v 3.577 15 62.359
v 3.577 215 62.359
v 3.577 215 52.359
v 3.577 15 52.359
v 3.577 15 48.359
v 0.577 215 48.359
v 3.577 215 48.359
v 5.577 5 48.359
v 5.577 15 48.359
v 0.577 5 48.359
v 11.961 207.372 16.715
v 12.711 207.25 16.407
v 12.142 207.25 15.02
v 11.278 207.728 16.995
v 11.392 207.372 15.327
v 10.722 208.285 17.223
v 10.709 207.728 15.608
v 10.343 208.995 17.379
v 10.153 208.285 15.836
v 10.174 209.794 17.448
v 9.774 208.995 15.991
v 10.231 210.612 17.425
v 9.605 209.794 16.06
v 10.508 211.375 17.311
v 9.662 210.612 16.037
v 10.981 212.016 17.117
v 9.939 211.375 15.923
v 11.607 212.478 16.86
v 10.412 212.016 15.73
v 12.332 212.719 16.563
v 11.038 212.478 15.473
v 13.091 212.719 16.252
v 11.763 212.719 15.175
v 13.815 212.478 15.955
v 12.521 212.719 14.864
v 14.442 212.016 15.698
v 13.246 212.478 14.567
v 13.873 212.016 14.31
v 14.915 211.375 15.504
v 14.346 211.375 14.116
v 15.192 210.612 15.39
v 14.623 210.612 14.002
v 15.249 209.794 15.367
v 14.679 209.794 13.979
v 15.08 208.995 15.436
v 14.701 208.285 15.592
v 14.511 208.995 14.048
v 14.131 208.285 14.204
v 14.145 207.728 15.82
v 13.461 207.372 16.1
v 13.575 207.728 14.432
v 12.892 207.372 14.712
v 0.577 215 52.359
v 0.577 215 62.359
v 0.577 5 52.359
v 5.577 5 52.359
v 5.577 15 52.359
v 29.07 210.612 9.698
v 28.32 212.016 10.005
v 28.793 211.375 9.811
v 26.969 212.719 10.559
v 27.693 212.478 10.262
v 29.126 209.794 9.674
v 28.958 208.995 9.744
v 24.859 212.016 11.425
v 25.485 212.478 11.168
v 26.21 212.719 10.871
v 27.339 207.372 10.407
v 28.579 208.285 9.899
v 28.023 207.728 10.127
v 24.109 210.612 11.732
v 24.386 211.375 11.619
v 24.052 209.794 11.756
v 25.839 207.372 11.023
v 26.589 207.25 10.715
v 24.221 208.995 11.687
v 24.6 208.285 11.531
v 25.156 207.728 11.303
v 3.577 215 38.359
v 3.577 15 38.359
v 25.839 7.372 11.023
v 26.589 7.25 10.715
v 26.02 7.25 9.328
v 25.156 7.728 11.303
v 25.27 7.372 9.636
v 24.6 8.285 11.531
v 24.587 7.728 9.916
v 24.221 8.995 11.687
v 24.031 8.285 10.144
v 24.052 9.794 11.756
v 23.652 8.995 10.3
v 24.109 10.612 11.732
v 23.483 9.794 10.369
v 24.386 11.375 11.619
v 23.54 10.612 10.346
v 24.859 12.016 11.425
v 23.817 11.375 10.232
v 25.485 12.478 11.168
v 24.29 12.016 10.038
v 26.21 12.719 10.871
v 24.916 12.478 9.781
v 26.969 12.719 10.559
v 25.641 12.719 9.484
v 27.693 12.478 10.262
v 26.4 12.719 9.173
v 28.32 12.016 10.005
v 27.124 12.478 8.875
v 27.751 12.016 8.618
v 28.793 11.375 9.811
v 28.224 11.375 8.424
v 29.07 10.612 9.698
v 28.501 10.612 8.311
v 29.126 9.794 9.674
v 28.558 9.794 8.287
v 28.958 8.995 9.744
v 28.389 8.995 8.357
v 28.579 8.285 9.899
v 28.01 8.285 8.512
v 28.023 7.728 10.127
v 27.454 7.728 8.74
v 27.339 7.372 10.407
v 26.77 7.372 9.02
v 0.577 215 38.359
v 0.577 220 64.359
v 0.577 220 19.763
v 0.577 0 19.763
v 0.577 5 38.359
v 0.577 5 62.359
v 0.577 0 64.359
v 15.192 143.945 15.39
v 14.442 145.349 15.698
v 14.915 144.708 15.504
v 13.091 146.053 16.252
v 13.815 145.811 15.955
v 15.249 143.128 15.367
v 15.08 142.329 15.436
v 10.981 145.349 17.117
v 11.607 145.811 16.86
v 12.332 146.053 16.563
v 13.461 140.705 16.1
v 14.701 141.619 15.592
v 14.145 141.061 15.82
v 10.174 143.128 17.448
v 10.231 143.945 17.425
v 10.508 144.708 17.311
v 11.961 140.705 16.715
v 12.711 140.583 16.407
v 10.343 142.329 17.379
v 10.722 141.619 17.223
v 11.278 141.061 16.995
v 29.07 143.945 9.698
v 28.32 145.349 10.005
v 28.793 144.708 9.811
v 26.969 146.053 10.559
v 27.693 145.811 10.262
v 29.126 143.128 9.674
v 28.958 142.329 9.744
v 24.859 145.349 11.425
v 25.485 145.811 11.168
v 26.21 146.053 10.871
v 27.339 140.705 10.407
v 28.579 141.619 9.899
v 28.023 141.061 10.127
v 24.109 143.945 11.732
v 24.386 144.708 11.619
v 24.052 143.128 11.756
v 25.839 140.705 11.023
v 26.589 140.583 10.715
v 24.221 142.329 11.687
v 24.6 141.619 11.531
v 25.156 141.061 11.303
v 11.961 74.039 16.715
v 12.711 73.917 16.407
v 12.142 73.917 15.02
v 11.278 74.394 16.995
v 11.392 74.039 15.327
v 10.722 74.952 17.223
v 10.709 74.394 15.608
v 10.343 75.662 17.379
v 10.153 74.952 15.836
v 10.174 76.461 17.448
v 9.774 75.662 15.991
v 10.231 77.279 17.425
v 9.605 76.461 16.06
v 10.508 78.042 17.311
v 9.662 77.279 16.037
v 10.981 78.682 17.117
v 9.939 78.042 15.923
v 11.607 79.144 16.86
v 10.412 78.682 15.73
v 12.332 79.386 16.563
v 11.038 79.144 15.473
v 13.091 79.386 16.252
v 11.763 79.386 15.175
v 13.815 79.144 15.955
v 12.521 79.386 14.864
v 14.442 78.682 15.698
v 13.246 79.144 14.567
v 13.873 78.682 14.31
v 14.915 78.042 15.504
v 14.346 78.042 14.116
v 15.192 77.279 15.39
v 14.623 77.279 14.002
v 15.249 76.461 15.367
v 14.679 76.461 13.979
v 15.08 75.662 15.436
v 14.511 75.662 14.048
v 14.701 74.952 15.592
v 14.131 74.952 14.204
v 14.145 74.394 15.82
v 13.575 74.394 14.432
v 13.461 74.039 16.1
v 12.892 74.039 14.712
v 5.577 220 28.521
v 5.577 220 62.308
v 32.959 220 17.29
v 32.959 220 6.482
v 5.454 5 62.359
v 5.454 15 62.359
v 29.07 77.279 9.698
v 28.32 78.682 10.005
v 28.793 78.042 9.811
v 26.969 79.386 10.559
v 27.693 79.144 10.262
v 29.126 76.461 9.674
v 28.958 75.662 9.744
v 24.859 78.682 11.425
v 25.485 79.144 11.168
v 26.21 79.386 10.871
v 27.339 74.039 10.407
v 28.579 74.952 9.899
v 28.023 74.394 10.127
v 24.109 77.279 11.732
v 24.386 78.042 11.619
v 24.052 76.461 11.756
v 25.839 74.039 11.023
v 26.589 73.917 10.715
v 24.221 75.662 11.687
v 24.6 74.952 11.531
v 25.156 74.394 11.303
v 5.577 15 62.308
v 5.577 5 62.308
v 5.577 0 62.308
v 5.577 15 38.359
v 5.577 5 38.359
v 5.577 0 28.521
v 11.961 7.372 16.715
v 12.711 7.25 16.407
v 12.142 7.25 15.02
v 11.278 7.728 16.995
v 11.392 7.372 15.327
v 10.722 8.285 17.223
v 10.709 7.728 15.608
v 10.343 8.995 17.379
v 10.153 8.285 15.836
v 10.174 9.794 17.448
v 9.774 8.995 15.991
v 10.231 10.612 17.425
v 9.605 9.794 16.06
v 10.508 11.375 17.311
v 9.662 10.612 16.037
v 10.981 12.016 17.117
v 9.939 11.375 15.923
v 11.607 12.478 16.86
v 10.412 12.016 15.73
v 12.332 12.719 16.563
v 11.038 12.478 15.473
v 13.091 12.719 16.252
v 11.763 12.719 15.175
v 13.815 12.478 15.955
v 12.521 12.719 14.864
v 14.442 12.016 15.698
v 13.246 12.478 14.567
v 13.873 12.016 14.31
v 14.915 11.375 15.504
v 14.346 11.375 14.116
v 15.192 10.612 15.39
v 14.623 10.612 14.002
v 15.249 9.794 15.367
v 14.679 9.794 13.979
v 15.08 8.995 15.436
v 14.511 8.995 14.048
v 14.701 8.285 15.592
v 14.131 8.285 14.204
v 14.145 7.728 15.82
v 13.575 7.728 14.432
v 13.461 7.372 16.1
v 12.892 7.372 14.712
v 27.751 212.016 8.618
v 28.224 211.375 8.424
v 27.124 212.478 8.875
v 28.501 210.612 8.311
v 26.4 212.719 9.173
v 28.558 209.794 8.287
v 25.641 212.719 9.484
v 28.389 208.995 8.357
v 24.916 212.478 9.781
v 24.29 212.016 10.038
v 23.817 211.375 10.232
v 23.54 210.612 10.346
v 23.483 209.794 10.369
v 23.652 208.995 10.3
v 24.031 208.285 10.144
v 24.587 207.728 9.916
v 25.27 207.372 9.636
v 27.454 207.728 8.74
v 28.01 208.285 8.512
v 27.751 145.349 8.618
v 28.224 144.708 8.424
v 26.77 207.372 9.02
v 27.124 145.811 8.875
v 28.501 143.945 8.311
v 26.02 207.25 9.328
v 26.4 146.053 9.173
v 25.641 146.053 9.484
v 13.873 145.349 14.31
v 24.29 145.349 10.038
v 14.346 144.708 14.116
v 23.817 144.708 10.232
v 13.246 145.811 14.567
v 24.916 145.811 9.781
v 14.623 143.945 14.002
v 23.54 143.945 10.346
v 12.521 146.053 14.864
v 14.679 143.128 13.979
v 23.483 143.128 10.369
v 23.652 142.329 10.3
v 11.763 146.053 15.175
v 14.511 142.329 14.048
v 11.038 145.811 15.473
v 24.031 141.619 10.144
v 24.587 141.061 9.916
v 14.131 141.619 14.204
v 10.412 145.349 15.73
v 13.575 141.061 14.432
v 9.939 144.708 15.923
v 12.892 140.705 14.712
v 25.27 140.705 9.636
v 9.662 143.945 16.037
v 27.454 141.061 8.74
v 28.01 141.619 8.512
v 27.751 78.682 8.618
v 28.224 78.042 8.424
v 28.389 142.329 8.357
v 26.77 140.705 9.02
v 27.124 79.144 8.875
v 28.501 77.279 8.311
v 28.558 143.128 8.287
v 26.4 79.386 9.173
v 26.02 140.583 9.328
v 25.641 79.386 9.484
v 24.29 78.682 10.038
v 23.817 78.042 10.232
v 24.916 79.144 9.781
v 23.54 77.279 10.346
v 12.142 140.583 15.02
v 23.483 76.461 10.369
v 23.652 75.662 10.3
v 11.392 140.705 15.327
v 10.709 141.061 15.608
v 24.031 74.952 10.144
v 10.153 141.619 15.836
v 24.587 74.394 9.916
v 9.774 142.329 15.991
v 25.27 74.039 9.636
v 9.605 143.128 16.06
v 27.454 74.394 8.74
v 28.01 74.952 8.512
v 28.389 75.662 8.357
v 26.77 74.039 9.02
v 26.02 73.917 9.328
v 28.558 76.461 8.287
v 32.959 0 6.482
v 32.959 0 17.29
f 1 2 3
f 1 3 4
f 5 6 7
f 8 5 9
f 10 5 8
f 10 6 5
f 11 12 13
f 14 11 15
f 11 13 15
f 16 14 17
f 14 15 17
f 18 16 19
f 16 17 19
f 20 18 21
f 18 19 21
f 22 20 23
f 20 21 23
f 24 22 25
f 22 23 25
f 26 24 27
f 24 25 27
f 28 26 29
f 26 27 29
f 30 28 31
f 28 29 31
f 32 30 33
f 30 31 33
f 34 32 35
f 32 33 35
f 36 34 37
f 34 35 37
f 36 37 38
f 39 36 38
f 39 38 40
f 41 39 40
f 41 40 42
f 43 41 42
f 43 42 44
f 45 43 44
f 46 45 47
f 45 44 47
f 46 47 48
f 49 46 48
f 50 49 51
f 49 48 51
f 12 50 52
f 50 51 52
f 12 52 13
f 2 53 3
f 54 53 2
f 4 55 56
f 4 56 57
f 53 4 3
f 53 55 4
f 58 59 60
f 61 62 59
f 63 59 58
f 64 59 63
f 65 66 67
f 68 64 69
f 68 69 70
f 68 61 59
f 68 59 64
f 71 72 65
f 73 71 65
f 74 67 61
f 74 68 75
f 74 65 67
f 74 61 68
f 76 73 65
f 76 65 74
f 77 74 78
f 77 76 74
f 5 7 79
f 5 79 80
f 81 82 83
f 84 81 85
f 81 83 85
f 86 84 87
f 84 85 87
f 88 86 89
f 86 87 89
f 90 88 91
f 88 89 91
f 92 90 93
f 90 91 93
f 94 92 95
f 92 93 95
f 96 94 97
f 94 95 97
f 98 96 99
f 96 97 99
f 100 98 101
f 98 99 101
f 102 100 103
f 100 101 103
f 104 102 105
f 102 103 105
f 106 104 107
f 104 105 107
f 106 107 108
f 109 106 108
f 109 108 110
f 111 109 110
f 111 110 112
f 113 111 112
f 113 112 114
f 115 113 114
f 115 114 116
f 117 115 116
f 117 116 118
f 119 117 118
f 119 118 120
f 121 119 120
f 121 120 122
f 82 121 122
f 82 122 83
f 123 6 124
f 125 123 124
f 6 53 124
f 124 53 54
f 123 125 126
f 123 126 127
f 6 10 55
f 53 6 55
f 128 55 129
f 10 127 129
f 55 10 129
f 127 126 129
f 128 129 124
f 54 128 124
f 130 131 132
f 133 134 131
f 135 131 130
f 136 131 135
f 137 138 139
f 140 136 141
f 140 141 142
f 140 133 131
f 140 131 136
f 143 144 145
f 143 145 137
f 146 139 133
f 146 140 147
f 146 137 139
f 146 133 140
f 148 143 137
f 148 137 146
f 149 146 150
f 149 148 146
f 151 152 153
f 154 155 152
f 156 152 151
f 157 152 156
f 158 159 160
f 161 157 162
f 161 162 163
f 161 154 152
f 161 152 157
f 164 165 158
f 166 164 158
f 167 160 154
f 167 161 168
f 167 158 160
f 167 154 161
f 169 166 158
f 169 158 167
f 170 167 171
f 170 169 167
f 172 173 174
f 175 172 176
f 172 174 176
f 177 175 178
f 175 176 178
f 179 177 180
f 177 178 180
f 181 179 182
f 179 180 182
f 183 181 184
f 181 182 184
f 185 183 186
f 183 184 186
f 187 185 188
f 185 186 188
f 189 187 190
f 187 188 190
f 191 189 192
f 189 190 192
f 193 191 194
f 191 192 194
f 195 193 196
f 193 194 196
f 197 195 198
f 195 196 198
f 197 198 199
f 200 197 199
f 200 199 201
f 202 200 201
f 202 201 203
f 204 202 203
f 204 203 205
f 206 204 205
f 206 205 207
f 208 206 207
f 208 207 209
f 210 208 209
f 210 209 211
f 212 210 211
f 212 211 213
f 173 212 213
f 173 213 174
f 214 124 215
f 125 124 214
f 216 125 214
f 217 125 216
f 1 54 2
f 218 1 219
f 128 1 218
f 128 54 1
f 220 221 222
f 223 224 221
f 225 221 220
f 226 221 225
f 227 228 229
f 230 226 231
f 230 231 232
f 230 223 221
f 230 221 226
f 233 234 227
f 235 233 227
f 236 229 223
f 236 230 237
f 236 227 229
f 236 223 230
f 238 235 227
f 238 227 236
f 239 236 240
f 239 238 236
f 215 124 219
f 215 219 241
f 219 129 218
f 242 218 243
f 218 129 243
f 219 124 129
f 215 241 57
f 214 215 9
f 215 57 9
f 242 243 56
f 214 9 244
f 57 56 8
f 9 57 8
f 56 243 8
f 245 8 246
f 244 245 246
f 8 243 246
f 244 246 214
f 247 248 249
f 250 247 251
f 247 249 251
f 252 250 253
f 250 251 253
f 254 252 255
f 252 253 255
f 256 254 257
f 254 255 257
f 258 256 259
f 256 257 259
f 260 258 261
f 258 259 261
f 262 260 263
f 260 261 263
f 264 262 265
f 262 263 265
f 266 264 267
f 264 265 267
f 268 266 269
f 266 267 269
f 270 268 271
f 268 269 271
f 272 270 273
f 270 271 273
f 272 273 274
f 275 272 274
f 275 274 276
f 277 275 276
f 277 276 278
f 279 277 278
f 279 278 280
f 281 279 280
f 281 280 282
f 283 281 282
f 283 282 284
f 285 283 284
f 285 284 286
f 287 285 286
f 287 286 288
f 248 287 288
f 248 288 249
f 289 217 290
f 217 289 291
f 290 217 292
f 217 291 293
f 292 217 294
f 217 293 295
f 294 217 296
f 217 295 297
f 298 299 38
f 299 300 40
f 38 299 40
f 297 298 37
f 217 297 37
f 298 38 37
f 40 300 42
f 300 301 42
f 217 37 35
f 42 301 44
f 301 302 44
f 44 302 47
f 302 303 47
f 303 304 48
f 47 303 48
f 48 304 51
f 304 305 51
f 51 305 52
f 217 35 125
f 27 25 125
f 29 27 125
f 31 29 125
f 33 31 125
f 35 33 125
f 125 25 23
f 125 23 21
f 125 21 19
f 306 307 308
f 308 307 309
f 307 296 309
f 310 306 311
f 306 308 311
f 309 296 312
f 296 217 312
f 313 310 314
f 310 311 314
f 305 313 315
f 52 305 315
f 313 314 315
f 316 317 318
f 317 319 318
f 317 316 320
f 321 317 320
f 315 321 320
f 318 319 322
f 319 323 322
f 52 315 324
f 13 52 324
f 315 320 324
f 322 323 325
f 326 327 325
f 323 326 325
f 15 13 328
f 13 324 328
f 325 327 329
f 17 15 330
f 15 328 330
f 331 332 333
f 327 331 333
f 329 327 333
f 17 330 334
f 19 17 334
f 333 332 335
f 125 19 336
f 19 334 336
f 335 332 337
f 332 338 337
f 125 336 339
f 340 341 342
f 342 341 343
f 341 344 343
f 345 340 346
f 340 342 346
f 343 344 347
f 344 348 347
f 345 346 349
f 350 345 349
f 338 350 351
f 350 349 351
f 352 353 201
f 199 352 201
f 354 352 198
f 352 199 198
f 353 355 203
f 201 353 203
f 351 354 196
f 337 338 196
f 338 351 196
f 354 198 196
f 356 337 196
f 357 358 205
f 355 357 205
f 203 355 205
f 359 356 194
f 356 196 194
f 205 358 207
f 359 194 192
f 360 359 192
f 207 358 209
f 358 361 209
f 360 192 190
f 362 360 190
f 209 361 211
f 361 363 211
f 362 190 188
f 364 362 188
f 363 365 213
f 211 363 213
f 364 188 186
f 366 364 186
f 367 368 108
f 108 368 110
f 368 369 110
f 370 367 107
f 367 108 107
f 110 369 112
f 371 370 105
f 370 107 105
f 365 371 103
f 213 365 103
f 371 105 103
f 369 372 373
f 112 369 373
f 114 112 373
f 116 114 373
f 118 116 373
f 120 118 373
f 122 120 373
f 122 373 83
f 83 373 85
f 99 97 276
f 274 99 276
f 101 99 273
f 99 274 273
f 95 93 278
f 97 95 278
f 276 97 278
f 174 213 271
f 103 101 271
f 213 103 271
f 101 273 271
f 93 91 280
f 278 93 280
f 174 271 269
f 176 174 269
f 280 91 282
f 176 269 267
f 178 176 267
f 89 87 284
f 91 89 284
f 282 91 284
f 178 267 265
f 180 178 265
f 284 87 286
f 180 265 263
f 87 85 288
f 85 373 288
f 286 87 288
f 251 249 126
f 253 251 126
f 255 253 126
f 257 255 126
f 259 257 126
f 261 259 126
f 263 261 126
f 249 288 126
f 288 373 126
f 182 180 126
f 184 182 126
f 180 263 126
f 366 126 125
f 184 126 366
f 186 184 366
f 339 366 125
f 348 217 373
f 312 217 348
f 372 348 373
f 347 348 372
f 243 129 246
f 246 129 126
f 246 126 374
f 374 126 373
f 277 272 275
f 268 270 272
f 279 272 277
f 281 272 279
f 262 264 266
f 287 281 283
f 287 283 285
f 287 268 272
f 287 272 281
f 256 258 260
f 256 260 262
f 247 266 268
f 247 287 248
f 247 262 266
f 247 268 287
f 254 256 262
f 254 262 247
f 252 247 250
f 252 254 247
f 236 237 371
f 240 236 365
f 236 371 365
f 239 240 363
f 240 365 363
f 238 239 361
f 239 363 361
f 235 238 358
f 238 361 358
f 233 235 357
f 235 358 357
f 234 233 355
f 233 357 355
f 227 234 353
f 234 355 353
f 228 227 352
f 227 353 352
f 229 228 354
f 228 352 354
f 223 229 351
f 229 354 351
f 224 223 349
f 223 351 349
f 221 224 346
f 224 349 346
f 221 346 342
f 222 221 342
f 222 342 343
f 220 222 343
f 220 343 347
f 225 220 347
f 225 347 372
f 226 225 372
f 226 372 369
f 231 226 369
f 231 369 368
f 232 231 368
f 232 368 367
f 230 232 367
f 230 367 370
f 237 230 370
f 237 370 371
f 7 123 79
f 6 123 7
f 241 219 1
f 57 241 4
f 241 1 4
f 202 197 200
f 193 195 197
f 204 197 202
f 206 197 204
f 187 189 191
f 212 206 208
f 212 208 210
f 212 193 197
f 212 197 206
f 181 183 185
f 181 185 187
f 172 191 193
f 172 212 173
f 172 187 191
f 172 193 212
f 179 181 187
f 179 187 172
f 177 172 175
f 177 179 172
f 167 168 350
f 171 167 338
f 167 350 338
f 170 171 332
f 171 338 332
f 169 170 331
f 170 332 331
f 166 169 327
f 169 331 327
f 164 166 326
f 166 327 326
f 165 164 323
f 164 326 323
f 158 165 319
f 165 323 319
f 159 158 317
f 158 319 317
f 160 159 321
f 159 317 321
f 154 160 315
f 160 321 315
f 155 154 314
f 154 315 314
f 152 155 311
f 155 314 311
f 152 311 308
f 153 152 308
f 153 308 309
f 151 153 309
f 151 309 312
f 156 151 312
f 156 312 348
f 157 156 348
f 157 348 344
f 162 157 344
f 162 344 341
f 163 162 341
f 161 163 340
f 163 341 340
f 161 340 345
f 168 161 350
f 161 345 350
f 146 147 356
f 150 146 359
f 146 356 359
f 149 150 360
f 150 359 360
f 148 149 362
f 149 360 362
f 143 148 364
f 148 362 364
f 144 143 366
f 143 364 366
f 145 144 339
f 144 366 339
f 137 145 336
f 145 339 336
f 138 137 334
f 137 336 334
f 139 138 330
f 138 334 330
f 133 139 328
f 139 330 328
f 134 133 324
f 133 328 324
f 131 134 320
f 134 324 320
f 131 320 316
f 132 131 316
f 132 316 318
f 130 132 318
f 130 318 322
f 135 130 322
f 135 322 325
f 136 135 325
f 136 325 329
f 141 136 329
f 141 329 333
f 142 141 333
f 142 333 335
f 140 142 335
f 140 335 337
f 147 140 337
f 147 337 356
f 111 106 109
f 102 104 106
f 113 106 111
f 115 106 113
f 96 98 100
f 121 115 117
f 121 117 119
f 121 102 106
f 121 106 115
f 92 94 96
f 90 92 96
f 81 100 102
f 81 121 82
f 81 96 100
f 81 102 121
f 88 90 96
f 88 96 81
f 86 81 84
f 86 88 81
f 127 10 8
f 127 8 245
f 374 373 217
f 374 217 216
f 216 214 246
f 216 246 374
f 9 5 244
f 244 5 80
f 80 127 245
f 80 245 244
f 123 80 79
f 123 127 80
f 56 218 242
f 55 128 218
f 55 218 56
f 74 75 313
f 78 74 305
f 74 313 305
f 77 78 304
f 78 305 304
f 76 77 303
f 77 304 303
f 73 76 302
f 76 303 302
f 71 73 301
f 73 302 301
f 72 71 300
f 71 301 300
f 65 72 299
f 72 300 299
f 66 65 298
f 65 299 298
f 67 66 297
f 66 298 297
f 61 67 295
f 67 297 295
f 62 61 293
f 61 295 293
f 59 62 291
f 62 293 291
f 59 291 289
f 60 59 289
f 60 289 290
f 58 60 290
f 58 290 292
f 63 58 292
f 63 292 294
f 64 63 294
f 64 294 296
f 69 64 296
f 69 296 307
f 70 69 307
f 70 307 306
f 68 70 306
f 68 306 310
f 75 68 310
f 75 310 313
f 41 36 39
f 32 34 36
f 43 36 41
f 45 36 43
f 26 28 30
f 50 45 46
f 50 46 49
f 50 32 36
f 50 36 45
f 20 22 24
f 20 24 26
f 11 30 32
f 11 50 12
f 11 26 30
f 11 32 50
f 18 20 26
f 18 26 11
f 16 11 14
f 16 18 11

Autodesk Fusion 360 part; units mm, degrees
sketch "Name Sign LED Holder Top" plane through (0, 0, 0) normal (0, 1, 0) x (1, 0, 0)
  line L0 (0.5771, -64.3591) -> (5.5771, -64.3591)
  line L1 (5.5771, -64.3591) -> (5.5771, -28.5209)
  line L2 (5.5771, -28.5209) -> (36.754, -15.7343)
  line L3 (36.754, -15.7343) -> (32.9594, -6.4822)
  line L4 (32.9594, -6.4822) -> (0.5771, -19.7631)
  line L5 (0.5771, -19.7631) -> (0.5771, -64.3591)
  line L6 (0.5771, -64.3591) -> (5.5771, -62.3085)
  line L7 (32.9594, -6.4822) -> (32.9594, -17.2905)
  dimension "d1" = 5
  dimension "d2" = 10
  dimension "d3" = 112.3
  dimension "d16" = 44.596
  dimension "d18" = 22.3
  dimension "d20" = 35
extrude "Extrude1" add sketch "Name Sign LED Holder Top" along normal blind 220 contours L1 L2 L4 L5 L6 L7
sketch "LED Grooves" plane through (0.5771, 0, 0) normal (-1, 0, 0) x (0, -1, 0)
  line L0 (0, 19.7631) -> (0, 64.3591)
  line L1 (-220, 64.3591) -> (-220, 19.7631)
  line L2 (-220, 19.7631) -> (0, 19.7631)
  line L3 (-215, 62.3591) -> (-5, 62.3591)
  line L4 (-5, 62.3591) -> (-5, 52.3591)
  line L5 (-5, 52.3591) -> (-215, 52.3591)
  line L6 (-215, 52.3591) -> (-215, 62.3591)
  line L7 (-215, 48.3591) -> (-5, 48.3591)
  line L8 (-5, 48.3591) -> (-5, 38.3591)
  line L9 (-5, 38.3591) -> (-215, 38.3591)
  line L10 (-215, 38.3591) -> (-215, 48.3591)
  line L11 (-5, 62.3591) -> (-15, 62.3591)
  line L12 (-15, 52.3591) -> (-5, 52.3591)
  line L13 (-5, 52.3591) -> (-5, 62.3591)
  line L14 (-5, 48.3591) -> (-15, 48.3591)
  line L15 (-15, 38.3591) -> (-5, 38.3591)
  line L16 (-5, 38.3591) -> (-5, 48.3591)
  line L17 (0, 64.3591) -> (-220, 64.3591)
  dimension "d6" = 210
  dimension "d7" = 210
  dimension "d8" = 5
  dimension "d9" = 5
  dimension "d12" = 10
  dimension "d13" = 10
  dimension "d22" = 4
  dimension "d30" = 2
extrude "Extrude2" cut sketch "LED Grooves" against normal blind 3 contours L3 L4 L5 L6 L11 L12 L13 | L7 L8 L9 L10 L14 L15 L16
sketch "Top LED Hole" plane through (3.5771, 0, 0) normal (-1, 0, 0) x (0, -1, 0)
  line L0 (-215, 52.3591) -> (-5, 52.3591)
  line L1 (-5, 52.3591) -> (-5, 62.3591)
  line L2 (-5, 62.3591) -> (-215, 62.3591)
  line L3 (-215, 62.3591) -> (-215, 52.3591)
  line L4 (-5, 62.3591) -> (-15, 62.3591)
  line L5 (-15, 62.3591) -> (-15, 52.3591)
  line L6 (-15, 52.3591) -> (-5, 52.3591)
  line L7 (-5, 52.3591) -> (-5, 62.3591)
  dimension "d33" = 10
  dimension "d34" = 10
sketch "Bottom LED Hole" plane through (3.5771, 0, 0) normal (-1, 0, 0) x (0, -1, 0)
  line L0 (-215, 38.3591) -> (-5, 38.3591)
  line L1 (-5, 38.3591) -> (-5, 48.3591)
  line L2 (-215, 48.3591) -> (-215, 38.3591)
  line L3 (-5, 48.3591) -> (-15, 48.3591)
  line L4 (-15, 48.3591) -> (-15, 38.3591)
  line L5 (-15, 38.3591) -> (-5, 38.3591)
  line L6 (-5, 38.3591) -> (-5, 48.3591)
  line L7 (-5, 48.3591) -> (-215, 48.3591)
  dimension "d26" = 10
  dimension "d27" = 10
extrude "Extrude3" cut sketch "Top LED Hole" sketch "Bottom LED Hole" against normal blind 2 contours L0 L1 L2 L4 L5 L6 L7 of sketch 2 contours L0 L1 L3 L4 L5 L6 L7
sketch "Magnet Holes" plane through (7.0215, 0, 17.1201) normal (-0.3795, 0, -0.9252) x (0, -1, 0)
  line L0 (0, -28.0347) -> (0, 6.9653)
  line L1 (0, 6.9653) -> (-220, 6.9653)
  line L2 (-220, 6.9653) -> (-220, -28.0347)
  line L3 (-220, -28.0347) -> (0, -28.0347)
  circle A0 centre (-210, -5.5347) radius 2.75
  dimension "d39" = 5.5
  dimension "d47" = 10
  dimension "d48" = 12.5
extrude "Extrude4" cut sketch "Magnet Holes" against normal blind 1.5 contours A0
pattern_linear "R-Pattern1" count 4 spacing 66.6667 along (0, -1, 0) count 2 spacing 15 along (0.9252, 0, -0.3795) of "Extrude4"
equation "d4 = 200 mm + 10 mm + 5 mm + 5 mm"
equation "d6 = 200 mm + 10 mm"
equation "d7 = 200 mm + 10 mm"
equation "d16 = 50 mm - 5.404 mm"
equation "magnet_hole_diameter = 5.5 mm"
equation "magnet_hole_depth = 1.5 mm"
equation "d39 = magnet_hole_diameter"
equation "d45 = magnet_pattern_height"
equation "magnet_hole_side_offset = 10 mm"
equation "d47 = magnet_hole_side_offset"
equation "d48 = vertical_part_width + magnet_hole_top_offset"
equation "magnet_hole_top_offset = 7.5 mm"
equation "magnet_pattern_length = 220.00 mm - 2 * ( magnet_hole_side_offset )"
equation "magnet_pattern_height = 35.00 mm - vertical_part_width - 2 * ( magnet_hole_top_offset )"
equation "vertical_part_width = 5.00 mm"
